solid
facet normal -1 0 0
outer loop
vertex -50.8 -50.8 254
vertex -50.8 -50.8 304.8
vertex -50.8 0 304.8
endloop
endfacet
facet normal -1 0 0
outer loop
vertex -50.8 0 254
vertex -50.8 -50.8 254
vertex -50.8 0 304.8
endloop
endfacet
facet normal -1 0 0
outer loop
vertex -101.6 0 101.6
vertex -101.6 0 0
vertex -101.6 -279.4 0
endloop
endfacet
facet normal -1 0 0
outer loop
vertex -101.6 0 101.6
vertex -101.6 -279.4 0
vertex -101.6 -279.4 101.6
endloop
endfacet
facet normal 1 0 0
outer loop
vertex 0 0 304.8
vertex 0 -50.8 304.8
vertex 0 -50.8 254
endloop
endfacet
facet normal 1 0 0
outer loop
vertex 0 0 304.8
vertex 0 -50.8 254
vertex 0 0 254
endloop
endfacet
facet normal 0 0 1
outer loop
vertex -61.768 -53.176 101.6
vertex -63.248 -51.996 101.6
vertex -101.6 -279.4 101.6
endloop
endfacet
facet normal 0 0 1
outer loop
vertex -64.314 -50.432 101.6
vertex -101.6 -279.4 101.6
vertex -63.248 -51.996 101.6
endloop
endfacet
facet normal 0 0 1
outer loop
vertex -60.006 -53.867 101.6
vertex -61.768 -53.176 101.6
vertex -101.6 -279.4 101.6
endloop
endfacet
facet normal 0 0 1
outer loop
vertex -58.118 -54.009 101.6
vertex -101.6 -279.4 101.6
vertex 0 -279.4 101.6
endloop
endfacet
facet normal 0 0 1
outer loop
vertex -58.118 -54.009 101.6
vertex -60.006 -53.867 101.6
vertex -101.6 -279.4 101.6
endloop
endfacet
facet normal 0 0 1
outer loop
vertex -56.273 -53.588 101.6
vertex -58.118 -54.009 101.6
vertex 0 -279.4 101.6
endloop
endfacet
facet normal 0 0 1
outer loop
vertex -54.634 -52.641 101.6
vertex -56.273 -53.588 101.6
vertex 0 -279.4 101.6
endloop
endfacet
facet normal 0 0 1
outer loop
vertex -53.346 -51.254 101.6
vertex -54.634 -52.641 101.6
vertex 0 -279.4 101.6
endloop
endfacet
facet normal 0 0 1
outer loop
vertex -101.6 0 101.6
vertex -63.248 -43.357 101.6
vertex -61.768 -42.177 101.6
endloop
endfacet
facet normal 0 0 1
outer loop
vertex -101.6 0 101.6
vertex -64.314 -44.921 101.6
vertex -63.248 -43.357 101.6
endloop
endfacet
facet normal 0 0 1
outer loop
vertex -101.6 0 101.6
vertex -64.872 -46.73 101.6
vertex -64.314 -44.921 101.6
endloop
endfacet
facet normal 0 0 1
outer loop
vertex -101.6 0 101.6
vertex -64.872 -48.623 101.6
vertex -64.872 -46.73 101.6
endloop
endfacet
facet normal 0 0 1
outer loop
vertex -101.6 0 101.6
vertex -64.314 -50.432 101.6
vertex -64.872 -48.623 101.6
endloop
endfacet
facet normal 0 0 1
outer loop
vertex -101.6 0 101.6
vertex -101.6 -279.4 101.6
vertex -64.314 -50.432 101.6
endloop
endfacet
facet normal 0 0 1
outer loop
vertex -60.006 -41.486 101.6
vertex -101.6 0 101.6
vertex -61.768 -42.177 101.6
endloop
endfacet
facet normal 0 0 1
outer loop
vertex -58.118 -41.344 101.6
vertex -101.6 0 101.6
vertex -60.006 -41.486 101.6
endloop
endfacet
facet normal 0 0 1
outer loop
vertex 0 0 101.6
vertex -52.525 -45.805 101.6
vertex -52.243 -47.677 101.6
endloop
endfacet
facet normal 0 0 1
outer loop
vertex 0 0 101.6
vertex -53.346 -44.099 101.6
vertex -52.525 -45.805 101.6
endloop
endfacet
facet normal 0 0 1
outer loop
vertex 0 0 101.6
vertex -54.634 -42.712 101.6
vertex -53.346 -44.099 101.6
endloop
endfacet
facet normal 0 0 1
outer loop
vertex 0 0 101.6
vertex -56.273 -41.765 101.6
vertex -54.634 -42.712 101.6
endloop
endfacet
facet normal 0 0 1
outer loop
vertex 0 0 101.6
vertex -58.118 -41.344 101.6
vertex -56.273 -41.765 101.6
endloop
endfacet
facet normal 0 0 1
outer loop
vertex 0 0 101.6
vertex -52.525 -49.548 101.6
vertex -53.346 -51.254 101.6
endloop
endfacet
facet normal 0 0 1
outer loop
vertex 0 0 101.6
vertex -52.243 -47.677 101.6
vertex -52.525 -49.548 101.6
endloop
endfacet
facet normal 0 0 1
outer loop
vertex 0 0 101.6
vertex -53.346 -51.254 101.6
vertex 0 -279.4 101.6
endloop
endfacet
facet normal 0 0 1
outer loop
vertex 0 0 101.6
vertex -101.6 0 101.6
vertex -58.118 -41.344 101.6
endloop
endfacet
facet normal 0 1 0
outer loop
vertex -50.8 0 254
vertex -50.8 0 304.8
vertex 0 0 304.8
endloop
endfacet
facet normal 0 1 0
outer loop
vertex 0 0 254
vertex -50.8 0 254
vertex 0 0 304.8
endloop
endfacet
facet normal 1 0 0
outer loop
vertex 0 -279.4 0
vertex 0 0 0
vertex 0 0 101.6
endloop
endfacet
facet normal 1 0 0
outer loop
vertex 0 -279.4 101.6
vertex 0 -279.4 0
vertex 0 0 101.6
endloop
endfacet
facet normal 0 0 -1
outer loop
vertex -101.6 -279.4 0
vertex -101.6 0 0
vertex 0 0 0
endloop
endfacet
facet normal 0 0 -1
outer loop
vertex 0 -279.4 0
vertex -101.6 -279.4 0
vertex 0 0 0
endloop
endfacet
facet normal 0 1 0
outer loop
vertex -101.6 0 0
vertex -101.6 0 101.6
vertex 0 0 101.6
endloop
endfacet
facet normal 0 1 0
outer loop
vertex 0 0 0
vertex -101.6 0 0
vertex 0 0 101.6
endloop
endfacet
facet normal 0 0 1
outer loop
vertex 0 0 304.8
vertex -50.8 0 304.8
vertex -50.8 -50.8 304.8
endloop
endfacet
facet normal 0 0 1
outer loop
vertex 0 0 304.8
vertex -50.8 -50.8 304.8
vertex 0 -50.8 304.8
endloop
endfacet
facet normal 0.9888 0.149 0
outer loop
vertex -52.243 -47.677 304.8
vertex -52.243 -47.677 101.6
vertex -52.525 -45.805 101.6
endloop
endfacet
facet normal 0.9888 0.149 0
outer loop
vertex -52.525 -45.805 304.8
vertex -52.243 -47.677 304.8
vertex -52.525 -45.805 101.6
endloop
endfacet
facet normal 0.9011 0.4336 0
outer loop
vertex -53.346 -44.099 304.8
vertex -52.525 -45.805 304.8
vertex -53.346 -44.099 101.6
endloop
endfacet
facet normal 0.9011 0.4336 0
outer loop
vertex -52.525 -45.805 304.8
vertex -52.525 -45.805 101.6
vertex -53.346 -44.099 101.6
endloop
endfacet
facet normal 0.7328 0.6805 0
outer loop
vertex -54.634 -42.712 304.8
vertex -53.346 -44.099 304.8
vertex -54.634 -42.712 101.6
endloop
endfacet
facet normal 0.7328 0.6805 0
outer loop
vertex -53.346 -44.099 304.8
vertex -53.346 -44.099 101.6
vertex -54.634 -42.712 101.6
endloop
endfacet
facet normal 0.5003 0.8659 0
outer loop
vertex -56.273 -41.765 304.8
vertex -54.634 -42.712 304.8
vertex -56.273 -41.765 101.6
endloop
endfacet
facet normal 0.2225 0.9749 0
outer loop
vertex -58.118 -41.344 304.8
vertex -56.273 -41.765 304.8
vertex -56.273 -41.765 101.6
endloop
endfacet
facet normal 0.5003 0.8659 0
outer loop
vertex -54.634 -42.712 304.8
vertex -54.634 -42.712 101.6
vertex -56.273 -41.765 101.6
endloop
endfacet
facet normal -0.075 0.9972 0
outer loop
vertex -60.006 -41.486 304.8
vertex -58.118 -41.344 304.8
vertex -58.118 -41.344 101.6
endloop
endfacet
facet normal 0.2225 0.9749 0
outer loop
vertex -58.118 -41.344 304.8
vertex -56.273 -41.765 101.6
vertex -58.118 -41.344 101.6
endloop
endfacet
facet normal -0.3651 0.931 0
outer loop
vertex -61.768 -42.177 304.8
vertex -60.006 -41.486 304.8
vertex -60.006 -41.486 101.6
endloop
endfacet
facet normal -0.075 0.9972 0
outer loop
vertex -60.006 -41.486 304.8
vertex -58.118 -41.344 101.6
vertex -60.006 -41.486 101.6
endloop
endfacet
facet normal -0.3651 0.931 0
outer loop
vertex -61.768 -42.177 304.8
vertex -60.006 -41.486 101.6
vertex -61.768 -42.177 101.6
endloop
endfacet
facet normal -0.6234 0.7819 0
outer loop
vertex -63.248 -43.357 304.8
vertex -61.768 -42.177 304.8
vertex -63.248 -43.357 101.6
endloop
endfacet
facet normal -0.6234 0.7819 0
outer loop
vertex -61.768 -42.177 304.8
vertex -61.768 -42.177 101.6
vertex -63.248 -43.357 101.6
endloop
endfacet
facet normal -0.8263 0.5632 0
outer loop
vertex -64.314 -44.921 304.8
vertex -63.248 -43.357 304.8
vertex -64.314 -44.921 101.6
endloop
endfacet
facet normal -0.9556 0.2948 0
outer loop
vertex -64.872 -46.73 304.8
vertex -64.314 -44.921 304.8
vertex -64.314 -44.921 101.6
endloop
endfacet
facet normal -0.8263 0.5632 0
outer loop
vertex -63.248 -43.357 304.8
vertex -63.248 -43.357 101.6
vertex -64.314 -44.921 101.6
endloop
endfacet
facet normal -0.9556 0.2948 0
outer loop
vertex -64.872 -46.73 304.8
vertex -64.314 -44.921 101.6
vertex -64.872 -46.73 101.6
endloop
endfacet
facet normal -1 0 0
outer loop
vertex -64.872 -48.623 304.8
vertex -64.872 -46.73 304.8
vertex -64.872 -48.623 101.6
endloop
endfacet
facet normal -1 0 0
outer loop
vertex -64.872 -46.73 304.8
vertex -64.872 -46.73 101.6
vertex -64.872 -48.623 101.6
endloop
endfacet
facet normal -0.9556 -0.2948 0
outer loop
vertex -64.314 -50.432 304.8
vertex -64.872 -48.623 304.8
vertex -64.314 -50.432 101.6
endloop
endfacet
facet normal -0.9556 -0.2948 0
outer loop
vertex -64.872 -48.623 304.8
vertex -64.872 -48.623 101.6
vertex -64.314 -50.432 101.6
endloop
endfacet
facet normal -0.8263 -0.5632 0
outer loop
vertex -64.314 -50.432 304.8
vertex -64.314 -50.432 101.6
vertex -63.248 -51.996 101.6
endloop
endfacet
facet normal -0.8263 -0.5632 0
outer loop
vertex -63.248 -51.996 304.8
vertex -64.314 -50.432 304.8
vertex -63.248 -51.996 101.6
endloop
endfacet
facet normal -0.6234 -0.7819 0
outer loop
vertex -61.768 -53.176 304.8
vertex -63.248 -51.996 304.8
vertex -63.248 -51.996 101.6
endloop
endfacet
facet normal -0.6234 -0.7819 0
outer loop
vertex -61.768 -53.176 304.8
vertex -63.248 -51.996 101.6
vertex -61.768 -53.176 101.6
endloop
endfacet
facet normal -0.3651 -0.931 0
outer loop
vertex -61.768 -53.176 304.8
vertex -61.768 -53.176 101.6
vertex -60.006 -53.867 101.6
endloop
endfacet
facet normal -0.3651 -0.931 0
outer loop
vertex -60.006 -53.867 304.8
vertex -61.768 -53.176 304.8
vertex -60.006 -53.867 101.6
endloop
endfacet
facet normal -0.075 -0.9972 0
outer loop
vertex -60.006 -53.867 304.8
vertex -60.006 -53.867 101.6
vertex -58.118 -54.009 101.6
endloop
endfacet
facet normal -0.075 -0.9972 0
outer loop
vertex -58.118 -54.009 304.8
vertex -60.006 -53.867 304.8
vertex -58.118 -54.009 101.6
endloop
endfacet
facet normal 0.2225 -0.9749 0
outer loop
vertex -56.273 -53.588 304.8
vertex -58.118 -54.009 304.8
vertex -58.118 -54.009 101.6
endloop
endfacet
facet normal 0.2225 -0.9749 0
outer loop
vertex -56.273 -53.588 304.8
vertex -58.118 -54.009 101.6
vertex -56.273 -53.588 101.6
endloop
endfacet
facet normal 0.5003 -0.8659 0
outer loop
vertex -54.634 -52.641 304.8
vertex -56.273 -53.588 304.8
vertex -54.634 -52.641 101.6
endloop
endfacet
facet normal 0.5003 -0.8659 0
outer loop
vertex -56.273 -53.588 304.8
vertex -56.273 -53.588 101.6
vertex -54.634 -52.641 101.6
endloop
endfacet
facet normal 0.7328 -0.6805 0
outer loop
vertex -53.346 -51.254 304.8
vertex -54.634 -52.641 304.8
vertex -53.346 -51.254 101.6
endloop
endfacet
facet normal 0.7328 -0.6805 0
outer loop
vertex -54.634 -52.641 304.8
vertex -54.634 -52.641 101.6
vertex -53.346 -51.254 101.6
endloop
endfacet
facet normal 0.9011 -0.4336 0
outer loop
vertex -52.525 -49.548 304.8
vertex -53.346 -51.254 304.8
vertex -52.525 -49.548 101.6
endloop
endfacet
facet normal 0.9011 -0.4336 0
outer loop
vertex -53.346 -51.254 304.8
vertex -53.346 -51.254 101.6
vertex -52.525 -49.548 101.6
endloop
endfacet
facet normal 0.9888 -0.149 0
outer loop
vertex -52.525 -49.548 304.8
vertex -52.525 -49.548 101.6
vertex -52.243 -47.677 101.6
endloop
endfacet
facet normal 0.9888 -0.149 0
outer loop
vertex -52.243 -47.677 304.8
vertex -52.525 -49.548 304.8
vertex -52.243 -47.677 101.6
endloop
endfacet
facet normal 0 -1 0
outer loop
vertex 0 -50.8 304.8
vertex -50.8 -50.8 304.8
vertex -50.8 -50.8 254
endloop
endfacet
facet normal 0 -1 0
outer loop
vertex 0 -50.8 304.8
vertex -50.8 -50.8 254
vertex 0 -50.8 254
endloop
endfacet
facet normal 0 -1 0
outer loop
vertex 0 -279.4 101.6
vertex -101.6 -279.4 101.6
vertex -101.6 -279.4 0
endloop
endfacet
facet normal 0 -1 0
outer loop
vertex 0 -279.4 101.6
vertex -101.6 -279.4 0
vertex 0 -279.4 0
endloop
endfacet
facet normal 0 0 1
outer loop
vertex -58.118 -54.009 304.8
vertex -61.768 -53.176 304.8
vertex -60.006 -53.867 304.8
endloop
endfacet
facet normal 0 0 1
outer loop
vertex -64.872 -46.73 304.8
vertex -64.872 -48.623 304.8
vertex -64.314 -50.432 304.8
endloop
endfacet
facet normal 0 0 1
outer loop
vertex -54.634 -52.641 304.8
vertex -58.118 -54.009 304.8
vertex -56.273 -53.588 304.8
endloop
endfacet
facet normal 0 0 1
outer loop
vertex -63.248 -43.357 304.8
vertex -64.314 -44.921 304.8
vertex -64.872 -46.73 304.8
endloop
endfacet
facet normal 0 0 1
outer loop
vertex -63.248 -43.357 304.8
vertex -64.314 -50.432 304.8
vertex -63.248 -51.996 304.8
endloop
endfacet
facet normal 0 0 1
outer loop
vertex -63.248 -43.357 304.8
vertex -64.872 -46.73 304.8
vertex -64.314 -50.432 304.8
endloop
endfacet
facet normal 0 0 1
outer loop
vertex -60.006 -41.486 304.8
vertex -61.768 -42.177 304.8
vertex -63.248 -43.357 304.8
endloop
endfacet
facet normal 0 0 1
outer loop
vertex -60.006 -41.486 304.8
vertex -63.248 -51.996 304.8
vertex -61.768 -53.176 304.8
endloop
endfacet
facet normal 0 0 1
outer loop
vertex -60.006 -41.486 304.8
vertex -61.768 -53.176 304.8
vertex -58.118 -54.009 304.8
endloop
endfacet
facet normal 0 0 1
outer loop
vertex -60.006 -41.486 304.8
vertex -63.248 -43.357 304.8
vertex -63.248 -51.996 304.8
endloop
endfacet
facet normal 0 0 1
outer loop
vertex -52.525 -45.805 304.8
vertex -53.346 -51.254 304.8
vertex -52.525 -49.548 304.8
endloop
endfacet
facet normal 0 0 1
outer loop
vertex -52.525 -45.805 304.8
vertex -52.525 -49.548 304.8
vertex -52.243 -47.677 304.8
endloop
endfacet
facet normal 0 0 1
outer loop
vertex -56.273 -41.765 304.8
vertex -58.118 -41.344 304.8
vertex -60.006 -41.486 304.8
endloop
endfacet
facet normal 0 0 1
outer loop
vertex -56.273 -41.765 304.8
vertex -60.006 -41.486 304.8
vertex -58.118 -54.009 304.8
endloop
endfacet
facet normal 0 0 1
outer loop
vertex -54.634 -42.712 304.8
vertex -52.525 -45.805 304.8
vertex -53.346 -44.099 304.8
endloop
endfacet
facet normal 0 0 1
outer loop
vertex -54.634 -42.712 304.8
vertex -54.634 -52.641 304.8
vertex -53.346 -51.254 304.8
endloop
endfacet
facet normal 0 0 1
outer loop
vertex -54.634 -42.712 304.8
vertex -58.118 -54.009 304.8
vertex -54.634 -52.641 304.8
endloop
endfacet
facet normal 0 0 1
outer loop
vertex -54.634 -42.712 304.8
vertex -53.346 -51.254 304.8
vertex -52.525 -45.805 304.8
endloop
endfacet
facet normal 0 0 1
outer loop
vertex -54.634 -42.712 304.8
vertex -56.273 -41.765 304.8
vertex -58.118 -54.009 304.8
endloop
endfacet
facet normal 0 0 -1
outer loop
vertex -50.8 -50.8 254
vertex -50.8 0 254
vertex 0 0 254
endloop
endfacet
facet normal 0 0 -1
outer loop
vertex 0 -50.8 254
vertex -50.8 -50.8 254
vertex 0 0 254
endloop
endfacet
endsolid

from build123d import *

# Parameters (mm, degrees)
F0_W     = 101.6
F0_H     = 101.6
F1_DEPTH = 279.4
F2_R     = 6.35
F3_DEPTH = 203.2
F4_W     = 50.8
F4_H     = 50.8
F5_DEPTH = 50.8


with BuildPart() as f1:
    # F0 (on Front) → F1 (new body)
    with BuildSketch(Plane.XZ):
        with Locations((-50.8, 50.8)):
            Rectangle(F0_W, F0_H)
    extrude(amount=F1_DEPTH)

    # F2 (on face) → F3 (join)
    with BuildSketch(Plane.XY.offset(101.6)):
        with Locations((-58.59277, -47.676526)):
            Circle(F2_R)
    extrude(amount=F3_DEPTH)


with BuildPart() as f5:
    # F4 (on face) → F5 (new body)
    with BuildSketch(Plane.XY.offset(304.8)):
        with Locations((-25.4, -25.4)):
            Rectangle(F4_W, F4_H)
    extrude(amount=-F5_DEPTH)


solid = Compound([f1.part, f5.part])
